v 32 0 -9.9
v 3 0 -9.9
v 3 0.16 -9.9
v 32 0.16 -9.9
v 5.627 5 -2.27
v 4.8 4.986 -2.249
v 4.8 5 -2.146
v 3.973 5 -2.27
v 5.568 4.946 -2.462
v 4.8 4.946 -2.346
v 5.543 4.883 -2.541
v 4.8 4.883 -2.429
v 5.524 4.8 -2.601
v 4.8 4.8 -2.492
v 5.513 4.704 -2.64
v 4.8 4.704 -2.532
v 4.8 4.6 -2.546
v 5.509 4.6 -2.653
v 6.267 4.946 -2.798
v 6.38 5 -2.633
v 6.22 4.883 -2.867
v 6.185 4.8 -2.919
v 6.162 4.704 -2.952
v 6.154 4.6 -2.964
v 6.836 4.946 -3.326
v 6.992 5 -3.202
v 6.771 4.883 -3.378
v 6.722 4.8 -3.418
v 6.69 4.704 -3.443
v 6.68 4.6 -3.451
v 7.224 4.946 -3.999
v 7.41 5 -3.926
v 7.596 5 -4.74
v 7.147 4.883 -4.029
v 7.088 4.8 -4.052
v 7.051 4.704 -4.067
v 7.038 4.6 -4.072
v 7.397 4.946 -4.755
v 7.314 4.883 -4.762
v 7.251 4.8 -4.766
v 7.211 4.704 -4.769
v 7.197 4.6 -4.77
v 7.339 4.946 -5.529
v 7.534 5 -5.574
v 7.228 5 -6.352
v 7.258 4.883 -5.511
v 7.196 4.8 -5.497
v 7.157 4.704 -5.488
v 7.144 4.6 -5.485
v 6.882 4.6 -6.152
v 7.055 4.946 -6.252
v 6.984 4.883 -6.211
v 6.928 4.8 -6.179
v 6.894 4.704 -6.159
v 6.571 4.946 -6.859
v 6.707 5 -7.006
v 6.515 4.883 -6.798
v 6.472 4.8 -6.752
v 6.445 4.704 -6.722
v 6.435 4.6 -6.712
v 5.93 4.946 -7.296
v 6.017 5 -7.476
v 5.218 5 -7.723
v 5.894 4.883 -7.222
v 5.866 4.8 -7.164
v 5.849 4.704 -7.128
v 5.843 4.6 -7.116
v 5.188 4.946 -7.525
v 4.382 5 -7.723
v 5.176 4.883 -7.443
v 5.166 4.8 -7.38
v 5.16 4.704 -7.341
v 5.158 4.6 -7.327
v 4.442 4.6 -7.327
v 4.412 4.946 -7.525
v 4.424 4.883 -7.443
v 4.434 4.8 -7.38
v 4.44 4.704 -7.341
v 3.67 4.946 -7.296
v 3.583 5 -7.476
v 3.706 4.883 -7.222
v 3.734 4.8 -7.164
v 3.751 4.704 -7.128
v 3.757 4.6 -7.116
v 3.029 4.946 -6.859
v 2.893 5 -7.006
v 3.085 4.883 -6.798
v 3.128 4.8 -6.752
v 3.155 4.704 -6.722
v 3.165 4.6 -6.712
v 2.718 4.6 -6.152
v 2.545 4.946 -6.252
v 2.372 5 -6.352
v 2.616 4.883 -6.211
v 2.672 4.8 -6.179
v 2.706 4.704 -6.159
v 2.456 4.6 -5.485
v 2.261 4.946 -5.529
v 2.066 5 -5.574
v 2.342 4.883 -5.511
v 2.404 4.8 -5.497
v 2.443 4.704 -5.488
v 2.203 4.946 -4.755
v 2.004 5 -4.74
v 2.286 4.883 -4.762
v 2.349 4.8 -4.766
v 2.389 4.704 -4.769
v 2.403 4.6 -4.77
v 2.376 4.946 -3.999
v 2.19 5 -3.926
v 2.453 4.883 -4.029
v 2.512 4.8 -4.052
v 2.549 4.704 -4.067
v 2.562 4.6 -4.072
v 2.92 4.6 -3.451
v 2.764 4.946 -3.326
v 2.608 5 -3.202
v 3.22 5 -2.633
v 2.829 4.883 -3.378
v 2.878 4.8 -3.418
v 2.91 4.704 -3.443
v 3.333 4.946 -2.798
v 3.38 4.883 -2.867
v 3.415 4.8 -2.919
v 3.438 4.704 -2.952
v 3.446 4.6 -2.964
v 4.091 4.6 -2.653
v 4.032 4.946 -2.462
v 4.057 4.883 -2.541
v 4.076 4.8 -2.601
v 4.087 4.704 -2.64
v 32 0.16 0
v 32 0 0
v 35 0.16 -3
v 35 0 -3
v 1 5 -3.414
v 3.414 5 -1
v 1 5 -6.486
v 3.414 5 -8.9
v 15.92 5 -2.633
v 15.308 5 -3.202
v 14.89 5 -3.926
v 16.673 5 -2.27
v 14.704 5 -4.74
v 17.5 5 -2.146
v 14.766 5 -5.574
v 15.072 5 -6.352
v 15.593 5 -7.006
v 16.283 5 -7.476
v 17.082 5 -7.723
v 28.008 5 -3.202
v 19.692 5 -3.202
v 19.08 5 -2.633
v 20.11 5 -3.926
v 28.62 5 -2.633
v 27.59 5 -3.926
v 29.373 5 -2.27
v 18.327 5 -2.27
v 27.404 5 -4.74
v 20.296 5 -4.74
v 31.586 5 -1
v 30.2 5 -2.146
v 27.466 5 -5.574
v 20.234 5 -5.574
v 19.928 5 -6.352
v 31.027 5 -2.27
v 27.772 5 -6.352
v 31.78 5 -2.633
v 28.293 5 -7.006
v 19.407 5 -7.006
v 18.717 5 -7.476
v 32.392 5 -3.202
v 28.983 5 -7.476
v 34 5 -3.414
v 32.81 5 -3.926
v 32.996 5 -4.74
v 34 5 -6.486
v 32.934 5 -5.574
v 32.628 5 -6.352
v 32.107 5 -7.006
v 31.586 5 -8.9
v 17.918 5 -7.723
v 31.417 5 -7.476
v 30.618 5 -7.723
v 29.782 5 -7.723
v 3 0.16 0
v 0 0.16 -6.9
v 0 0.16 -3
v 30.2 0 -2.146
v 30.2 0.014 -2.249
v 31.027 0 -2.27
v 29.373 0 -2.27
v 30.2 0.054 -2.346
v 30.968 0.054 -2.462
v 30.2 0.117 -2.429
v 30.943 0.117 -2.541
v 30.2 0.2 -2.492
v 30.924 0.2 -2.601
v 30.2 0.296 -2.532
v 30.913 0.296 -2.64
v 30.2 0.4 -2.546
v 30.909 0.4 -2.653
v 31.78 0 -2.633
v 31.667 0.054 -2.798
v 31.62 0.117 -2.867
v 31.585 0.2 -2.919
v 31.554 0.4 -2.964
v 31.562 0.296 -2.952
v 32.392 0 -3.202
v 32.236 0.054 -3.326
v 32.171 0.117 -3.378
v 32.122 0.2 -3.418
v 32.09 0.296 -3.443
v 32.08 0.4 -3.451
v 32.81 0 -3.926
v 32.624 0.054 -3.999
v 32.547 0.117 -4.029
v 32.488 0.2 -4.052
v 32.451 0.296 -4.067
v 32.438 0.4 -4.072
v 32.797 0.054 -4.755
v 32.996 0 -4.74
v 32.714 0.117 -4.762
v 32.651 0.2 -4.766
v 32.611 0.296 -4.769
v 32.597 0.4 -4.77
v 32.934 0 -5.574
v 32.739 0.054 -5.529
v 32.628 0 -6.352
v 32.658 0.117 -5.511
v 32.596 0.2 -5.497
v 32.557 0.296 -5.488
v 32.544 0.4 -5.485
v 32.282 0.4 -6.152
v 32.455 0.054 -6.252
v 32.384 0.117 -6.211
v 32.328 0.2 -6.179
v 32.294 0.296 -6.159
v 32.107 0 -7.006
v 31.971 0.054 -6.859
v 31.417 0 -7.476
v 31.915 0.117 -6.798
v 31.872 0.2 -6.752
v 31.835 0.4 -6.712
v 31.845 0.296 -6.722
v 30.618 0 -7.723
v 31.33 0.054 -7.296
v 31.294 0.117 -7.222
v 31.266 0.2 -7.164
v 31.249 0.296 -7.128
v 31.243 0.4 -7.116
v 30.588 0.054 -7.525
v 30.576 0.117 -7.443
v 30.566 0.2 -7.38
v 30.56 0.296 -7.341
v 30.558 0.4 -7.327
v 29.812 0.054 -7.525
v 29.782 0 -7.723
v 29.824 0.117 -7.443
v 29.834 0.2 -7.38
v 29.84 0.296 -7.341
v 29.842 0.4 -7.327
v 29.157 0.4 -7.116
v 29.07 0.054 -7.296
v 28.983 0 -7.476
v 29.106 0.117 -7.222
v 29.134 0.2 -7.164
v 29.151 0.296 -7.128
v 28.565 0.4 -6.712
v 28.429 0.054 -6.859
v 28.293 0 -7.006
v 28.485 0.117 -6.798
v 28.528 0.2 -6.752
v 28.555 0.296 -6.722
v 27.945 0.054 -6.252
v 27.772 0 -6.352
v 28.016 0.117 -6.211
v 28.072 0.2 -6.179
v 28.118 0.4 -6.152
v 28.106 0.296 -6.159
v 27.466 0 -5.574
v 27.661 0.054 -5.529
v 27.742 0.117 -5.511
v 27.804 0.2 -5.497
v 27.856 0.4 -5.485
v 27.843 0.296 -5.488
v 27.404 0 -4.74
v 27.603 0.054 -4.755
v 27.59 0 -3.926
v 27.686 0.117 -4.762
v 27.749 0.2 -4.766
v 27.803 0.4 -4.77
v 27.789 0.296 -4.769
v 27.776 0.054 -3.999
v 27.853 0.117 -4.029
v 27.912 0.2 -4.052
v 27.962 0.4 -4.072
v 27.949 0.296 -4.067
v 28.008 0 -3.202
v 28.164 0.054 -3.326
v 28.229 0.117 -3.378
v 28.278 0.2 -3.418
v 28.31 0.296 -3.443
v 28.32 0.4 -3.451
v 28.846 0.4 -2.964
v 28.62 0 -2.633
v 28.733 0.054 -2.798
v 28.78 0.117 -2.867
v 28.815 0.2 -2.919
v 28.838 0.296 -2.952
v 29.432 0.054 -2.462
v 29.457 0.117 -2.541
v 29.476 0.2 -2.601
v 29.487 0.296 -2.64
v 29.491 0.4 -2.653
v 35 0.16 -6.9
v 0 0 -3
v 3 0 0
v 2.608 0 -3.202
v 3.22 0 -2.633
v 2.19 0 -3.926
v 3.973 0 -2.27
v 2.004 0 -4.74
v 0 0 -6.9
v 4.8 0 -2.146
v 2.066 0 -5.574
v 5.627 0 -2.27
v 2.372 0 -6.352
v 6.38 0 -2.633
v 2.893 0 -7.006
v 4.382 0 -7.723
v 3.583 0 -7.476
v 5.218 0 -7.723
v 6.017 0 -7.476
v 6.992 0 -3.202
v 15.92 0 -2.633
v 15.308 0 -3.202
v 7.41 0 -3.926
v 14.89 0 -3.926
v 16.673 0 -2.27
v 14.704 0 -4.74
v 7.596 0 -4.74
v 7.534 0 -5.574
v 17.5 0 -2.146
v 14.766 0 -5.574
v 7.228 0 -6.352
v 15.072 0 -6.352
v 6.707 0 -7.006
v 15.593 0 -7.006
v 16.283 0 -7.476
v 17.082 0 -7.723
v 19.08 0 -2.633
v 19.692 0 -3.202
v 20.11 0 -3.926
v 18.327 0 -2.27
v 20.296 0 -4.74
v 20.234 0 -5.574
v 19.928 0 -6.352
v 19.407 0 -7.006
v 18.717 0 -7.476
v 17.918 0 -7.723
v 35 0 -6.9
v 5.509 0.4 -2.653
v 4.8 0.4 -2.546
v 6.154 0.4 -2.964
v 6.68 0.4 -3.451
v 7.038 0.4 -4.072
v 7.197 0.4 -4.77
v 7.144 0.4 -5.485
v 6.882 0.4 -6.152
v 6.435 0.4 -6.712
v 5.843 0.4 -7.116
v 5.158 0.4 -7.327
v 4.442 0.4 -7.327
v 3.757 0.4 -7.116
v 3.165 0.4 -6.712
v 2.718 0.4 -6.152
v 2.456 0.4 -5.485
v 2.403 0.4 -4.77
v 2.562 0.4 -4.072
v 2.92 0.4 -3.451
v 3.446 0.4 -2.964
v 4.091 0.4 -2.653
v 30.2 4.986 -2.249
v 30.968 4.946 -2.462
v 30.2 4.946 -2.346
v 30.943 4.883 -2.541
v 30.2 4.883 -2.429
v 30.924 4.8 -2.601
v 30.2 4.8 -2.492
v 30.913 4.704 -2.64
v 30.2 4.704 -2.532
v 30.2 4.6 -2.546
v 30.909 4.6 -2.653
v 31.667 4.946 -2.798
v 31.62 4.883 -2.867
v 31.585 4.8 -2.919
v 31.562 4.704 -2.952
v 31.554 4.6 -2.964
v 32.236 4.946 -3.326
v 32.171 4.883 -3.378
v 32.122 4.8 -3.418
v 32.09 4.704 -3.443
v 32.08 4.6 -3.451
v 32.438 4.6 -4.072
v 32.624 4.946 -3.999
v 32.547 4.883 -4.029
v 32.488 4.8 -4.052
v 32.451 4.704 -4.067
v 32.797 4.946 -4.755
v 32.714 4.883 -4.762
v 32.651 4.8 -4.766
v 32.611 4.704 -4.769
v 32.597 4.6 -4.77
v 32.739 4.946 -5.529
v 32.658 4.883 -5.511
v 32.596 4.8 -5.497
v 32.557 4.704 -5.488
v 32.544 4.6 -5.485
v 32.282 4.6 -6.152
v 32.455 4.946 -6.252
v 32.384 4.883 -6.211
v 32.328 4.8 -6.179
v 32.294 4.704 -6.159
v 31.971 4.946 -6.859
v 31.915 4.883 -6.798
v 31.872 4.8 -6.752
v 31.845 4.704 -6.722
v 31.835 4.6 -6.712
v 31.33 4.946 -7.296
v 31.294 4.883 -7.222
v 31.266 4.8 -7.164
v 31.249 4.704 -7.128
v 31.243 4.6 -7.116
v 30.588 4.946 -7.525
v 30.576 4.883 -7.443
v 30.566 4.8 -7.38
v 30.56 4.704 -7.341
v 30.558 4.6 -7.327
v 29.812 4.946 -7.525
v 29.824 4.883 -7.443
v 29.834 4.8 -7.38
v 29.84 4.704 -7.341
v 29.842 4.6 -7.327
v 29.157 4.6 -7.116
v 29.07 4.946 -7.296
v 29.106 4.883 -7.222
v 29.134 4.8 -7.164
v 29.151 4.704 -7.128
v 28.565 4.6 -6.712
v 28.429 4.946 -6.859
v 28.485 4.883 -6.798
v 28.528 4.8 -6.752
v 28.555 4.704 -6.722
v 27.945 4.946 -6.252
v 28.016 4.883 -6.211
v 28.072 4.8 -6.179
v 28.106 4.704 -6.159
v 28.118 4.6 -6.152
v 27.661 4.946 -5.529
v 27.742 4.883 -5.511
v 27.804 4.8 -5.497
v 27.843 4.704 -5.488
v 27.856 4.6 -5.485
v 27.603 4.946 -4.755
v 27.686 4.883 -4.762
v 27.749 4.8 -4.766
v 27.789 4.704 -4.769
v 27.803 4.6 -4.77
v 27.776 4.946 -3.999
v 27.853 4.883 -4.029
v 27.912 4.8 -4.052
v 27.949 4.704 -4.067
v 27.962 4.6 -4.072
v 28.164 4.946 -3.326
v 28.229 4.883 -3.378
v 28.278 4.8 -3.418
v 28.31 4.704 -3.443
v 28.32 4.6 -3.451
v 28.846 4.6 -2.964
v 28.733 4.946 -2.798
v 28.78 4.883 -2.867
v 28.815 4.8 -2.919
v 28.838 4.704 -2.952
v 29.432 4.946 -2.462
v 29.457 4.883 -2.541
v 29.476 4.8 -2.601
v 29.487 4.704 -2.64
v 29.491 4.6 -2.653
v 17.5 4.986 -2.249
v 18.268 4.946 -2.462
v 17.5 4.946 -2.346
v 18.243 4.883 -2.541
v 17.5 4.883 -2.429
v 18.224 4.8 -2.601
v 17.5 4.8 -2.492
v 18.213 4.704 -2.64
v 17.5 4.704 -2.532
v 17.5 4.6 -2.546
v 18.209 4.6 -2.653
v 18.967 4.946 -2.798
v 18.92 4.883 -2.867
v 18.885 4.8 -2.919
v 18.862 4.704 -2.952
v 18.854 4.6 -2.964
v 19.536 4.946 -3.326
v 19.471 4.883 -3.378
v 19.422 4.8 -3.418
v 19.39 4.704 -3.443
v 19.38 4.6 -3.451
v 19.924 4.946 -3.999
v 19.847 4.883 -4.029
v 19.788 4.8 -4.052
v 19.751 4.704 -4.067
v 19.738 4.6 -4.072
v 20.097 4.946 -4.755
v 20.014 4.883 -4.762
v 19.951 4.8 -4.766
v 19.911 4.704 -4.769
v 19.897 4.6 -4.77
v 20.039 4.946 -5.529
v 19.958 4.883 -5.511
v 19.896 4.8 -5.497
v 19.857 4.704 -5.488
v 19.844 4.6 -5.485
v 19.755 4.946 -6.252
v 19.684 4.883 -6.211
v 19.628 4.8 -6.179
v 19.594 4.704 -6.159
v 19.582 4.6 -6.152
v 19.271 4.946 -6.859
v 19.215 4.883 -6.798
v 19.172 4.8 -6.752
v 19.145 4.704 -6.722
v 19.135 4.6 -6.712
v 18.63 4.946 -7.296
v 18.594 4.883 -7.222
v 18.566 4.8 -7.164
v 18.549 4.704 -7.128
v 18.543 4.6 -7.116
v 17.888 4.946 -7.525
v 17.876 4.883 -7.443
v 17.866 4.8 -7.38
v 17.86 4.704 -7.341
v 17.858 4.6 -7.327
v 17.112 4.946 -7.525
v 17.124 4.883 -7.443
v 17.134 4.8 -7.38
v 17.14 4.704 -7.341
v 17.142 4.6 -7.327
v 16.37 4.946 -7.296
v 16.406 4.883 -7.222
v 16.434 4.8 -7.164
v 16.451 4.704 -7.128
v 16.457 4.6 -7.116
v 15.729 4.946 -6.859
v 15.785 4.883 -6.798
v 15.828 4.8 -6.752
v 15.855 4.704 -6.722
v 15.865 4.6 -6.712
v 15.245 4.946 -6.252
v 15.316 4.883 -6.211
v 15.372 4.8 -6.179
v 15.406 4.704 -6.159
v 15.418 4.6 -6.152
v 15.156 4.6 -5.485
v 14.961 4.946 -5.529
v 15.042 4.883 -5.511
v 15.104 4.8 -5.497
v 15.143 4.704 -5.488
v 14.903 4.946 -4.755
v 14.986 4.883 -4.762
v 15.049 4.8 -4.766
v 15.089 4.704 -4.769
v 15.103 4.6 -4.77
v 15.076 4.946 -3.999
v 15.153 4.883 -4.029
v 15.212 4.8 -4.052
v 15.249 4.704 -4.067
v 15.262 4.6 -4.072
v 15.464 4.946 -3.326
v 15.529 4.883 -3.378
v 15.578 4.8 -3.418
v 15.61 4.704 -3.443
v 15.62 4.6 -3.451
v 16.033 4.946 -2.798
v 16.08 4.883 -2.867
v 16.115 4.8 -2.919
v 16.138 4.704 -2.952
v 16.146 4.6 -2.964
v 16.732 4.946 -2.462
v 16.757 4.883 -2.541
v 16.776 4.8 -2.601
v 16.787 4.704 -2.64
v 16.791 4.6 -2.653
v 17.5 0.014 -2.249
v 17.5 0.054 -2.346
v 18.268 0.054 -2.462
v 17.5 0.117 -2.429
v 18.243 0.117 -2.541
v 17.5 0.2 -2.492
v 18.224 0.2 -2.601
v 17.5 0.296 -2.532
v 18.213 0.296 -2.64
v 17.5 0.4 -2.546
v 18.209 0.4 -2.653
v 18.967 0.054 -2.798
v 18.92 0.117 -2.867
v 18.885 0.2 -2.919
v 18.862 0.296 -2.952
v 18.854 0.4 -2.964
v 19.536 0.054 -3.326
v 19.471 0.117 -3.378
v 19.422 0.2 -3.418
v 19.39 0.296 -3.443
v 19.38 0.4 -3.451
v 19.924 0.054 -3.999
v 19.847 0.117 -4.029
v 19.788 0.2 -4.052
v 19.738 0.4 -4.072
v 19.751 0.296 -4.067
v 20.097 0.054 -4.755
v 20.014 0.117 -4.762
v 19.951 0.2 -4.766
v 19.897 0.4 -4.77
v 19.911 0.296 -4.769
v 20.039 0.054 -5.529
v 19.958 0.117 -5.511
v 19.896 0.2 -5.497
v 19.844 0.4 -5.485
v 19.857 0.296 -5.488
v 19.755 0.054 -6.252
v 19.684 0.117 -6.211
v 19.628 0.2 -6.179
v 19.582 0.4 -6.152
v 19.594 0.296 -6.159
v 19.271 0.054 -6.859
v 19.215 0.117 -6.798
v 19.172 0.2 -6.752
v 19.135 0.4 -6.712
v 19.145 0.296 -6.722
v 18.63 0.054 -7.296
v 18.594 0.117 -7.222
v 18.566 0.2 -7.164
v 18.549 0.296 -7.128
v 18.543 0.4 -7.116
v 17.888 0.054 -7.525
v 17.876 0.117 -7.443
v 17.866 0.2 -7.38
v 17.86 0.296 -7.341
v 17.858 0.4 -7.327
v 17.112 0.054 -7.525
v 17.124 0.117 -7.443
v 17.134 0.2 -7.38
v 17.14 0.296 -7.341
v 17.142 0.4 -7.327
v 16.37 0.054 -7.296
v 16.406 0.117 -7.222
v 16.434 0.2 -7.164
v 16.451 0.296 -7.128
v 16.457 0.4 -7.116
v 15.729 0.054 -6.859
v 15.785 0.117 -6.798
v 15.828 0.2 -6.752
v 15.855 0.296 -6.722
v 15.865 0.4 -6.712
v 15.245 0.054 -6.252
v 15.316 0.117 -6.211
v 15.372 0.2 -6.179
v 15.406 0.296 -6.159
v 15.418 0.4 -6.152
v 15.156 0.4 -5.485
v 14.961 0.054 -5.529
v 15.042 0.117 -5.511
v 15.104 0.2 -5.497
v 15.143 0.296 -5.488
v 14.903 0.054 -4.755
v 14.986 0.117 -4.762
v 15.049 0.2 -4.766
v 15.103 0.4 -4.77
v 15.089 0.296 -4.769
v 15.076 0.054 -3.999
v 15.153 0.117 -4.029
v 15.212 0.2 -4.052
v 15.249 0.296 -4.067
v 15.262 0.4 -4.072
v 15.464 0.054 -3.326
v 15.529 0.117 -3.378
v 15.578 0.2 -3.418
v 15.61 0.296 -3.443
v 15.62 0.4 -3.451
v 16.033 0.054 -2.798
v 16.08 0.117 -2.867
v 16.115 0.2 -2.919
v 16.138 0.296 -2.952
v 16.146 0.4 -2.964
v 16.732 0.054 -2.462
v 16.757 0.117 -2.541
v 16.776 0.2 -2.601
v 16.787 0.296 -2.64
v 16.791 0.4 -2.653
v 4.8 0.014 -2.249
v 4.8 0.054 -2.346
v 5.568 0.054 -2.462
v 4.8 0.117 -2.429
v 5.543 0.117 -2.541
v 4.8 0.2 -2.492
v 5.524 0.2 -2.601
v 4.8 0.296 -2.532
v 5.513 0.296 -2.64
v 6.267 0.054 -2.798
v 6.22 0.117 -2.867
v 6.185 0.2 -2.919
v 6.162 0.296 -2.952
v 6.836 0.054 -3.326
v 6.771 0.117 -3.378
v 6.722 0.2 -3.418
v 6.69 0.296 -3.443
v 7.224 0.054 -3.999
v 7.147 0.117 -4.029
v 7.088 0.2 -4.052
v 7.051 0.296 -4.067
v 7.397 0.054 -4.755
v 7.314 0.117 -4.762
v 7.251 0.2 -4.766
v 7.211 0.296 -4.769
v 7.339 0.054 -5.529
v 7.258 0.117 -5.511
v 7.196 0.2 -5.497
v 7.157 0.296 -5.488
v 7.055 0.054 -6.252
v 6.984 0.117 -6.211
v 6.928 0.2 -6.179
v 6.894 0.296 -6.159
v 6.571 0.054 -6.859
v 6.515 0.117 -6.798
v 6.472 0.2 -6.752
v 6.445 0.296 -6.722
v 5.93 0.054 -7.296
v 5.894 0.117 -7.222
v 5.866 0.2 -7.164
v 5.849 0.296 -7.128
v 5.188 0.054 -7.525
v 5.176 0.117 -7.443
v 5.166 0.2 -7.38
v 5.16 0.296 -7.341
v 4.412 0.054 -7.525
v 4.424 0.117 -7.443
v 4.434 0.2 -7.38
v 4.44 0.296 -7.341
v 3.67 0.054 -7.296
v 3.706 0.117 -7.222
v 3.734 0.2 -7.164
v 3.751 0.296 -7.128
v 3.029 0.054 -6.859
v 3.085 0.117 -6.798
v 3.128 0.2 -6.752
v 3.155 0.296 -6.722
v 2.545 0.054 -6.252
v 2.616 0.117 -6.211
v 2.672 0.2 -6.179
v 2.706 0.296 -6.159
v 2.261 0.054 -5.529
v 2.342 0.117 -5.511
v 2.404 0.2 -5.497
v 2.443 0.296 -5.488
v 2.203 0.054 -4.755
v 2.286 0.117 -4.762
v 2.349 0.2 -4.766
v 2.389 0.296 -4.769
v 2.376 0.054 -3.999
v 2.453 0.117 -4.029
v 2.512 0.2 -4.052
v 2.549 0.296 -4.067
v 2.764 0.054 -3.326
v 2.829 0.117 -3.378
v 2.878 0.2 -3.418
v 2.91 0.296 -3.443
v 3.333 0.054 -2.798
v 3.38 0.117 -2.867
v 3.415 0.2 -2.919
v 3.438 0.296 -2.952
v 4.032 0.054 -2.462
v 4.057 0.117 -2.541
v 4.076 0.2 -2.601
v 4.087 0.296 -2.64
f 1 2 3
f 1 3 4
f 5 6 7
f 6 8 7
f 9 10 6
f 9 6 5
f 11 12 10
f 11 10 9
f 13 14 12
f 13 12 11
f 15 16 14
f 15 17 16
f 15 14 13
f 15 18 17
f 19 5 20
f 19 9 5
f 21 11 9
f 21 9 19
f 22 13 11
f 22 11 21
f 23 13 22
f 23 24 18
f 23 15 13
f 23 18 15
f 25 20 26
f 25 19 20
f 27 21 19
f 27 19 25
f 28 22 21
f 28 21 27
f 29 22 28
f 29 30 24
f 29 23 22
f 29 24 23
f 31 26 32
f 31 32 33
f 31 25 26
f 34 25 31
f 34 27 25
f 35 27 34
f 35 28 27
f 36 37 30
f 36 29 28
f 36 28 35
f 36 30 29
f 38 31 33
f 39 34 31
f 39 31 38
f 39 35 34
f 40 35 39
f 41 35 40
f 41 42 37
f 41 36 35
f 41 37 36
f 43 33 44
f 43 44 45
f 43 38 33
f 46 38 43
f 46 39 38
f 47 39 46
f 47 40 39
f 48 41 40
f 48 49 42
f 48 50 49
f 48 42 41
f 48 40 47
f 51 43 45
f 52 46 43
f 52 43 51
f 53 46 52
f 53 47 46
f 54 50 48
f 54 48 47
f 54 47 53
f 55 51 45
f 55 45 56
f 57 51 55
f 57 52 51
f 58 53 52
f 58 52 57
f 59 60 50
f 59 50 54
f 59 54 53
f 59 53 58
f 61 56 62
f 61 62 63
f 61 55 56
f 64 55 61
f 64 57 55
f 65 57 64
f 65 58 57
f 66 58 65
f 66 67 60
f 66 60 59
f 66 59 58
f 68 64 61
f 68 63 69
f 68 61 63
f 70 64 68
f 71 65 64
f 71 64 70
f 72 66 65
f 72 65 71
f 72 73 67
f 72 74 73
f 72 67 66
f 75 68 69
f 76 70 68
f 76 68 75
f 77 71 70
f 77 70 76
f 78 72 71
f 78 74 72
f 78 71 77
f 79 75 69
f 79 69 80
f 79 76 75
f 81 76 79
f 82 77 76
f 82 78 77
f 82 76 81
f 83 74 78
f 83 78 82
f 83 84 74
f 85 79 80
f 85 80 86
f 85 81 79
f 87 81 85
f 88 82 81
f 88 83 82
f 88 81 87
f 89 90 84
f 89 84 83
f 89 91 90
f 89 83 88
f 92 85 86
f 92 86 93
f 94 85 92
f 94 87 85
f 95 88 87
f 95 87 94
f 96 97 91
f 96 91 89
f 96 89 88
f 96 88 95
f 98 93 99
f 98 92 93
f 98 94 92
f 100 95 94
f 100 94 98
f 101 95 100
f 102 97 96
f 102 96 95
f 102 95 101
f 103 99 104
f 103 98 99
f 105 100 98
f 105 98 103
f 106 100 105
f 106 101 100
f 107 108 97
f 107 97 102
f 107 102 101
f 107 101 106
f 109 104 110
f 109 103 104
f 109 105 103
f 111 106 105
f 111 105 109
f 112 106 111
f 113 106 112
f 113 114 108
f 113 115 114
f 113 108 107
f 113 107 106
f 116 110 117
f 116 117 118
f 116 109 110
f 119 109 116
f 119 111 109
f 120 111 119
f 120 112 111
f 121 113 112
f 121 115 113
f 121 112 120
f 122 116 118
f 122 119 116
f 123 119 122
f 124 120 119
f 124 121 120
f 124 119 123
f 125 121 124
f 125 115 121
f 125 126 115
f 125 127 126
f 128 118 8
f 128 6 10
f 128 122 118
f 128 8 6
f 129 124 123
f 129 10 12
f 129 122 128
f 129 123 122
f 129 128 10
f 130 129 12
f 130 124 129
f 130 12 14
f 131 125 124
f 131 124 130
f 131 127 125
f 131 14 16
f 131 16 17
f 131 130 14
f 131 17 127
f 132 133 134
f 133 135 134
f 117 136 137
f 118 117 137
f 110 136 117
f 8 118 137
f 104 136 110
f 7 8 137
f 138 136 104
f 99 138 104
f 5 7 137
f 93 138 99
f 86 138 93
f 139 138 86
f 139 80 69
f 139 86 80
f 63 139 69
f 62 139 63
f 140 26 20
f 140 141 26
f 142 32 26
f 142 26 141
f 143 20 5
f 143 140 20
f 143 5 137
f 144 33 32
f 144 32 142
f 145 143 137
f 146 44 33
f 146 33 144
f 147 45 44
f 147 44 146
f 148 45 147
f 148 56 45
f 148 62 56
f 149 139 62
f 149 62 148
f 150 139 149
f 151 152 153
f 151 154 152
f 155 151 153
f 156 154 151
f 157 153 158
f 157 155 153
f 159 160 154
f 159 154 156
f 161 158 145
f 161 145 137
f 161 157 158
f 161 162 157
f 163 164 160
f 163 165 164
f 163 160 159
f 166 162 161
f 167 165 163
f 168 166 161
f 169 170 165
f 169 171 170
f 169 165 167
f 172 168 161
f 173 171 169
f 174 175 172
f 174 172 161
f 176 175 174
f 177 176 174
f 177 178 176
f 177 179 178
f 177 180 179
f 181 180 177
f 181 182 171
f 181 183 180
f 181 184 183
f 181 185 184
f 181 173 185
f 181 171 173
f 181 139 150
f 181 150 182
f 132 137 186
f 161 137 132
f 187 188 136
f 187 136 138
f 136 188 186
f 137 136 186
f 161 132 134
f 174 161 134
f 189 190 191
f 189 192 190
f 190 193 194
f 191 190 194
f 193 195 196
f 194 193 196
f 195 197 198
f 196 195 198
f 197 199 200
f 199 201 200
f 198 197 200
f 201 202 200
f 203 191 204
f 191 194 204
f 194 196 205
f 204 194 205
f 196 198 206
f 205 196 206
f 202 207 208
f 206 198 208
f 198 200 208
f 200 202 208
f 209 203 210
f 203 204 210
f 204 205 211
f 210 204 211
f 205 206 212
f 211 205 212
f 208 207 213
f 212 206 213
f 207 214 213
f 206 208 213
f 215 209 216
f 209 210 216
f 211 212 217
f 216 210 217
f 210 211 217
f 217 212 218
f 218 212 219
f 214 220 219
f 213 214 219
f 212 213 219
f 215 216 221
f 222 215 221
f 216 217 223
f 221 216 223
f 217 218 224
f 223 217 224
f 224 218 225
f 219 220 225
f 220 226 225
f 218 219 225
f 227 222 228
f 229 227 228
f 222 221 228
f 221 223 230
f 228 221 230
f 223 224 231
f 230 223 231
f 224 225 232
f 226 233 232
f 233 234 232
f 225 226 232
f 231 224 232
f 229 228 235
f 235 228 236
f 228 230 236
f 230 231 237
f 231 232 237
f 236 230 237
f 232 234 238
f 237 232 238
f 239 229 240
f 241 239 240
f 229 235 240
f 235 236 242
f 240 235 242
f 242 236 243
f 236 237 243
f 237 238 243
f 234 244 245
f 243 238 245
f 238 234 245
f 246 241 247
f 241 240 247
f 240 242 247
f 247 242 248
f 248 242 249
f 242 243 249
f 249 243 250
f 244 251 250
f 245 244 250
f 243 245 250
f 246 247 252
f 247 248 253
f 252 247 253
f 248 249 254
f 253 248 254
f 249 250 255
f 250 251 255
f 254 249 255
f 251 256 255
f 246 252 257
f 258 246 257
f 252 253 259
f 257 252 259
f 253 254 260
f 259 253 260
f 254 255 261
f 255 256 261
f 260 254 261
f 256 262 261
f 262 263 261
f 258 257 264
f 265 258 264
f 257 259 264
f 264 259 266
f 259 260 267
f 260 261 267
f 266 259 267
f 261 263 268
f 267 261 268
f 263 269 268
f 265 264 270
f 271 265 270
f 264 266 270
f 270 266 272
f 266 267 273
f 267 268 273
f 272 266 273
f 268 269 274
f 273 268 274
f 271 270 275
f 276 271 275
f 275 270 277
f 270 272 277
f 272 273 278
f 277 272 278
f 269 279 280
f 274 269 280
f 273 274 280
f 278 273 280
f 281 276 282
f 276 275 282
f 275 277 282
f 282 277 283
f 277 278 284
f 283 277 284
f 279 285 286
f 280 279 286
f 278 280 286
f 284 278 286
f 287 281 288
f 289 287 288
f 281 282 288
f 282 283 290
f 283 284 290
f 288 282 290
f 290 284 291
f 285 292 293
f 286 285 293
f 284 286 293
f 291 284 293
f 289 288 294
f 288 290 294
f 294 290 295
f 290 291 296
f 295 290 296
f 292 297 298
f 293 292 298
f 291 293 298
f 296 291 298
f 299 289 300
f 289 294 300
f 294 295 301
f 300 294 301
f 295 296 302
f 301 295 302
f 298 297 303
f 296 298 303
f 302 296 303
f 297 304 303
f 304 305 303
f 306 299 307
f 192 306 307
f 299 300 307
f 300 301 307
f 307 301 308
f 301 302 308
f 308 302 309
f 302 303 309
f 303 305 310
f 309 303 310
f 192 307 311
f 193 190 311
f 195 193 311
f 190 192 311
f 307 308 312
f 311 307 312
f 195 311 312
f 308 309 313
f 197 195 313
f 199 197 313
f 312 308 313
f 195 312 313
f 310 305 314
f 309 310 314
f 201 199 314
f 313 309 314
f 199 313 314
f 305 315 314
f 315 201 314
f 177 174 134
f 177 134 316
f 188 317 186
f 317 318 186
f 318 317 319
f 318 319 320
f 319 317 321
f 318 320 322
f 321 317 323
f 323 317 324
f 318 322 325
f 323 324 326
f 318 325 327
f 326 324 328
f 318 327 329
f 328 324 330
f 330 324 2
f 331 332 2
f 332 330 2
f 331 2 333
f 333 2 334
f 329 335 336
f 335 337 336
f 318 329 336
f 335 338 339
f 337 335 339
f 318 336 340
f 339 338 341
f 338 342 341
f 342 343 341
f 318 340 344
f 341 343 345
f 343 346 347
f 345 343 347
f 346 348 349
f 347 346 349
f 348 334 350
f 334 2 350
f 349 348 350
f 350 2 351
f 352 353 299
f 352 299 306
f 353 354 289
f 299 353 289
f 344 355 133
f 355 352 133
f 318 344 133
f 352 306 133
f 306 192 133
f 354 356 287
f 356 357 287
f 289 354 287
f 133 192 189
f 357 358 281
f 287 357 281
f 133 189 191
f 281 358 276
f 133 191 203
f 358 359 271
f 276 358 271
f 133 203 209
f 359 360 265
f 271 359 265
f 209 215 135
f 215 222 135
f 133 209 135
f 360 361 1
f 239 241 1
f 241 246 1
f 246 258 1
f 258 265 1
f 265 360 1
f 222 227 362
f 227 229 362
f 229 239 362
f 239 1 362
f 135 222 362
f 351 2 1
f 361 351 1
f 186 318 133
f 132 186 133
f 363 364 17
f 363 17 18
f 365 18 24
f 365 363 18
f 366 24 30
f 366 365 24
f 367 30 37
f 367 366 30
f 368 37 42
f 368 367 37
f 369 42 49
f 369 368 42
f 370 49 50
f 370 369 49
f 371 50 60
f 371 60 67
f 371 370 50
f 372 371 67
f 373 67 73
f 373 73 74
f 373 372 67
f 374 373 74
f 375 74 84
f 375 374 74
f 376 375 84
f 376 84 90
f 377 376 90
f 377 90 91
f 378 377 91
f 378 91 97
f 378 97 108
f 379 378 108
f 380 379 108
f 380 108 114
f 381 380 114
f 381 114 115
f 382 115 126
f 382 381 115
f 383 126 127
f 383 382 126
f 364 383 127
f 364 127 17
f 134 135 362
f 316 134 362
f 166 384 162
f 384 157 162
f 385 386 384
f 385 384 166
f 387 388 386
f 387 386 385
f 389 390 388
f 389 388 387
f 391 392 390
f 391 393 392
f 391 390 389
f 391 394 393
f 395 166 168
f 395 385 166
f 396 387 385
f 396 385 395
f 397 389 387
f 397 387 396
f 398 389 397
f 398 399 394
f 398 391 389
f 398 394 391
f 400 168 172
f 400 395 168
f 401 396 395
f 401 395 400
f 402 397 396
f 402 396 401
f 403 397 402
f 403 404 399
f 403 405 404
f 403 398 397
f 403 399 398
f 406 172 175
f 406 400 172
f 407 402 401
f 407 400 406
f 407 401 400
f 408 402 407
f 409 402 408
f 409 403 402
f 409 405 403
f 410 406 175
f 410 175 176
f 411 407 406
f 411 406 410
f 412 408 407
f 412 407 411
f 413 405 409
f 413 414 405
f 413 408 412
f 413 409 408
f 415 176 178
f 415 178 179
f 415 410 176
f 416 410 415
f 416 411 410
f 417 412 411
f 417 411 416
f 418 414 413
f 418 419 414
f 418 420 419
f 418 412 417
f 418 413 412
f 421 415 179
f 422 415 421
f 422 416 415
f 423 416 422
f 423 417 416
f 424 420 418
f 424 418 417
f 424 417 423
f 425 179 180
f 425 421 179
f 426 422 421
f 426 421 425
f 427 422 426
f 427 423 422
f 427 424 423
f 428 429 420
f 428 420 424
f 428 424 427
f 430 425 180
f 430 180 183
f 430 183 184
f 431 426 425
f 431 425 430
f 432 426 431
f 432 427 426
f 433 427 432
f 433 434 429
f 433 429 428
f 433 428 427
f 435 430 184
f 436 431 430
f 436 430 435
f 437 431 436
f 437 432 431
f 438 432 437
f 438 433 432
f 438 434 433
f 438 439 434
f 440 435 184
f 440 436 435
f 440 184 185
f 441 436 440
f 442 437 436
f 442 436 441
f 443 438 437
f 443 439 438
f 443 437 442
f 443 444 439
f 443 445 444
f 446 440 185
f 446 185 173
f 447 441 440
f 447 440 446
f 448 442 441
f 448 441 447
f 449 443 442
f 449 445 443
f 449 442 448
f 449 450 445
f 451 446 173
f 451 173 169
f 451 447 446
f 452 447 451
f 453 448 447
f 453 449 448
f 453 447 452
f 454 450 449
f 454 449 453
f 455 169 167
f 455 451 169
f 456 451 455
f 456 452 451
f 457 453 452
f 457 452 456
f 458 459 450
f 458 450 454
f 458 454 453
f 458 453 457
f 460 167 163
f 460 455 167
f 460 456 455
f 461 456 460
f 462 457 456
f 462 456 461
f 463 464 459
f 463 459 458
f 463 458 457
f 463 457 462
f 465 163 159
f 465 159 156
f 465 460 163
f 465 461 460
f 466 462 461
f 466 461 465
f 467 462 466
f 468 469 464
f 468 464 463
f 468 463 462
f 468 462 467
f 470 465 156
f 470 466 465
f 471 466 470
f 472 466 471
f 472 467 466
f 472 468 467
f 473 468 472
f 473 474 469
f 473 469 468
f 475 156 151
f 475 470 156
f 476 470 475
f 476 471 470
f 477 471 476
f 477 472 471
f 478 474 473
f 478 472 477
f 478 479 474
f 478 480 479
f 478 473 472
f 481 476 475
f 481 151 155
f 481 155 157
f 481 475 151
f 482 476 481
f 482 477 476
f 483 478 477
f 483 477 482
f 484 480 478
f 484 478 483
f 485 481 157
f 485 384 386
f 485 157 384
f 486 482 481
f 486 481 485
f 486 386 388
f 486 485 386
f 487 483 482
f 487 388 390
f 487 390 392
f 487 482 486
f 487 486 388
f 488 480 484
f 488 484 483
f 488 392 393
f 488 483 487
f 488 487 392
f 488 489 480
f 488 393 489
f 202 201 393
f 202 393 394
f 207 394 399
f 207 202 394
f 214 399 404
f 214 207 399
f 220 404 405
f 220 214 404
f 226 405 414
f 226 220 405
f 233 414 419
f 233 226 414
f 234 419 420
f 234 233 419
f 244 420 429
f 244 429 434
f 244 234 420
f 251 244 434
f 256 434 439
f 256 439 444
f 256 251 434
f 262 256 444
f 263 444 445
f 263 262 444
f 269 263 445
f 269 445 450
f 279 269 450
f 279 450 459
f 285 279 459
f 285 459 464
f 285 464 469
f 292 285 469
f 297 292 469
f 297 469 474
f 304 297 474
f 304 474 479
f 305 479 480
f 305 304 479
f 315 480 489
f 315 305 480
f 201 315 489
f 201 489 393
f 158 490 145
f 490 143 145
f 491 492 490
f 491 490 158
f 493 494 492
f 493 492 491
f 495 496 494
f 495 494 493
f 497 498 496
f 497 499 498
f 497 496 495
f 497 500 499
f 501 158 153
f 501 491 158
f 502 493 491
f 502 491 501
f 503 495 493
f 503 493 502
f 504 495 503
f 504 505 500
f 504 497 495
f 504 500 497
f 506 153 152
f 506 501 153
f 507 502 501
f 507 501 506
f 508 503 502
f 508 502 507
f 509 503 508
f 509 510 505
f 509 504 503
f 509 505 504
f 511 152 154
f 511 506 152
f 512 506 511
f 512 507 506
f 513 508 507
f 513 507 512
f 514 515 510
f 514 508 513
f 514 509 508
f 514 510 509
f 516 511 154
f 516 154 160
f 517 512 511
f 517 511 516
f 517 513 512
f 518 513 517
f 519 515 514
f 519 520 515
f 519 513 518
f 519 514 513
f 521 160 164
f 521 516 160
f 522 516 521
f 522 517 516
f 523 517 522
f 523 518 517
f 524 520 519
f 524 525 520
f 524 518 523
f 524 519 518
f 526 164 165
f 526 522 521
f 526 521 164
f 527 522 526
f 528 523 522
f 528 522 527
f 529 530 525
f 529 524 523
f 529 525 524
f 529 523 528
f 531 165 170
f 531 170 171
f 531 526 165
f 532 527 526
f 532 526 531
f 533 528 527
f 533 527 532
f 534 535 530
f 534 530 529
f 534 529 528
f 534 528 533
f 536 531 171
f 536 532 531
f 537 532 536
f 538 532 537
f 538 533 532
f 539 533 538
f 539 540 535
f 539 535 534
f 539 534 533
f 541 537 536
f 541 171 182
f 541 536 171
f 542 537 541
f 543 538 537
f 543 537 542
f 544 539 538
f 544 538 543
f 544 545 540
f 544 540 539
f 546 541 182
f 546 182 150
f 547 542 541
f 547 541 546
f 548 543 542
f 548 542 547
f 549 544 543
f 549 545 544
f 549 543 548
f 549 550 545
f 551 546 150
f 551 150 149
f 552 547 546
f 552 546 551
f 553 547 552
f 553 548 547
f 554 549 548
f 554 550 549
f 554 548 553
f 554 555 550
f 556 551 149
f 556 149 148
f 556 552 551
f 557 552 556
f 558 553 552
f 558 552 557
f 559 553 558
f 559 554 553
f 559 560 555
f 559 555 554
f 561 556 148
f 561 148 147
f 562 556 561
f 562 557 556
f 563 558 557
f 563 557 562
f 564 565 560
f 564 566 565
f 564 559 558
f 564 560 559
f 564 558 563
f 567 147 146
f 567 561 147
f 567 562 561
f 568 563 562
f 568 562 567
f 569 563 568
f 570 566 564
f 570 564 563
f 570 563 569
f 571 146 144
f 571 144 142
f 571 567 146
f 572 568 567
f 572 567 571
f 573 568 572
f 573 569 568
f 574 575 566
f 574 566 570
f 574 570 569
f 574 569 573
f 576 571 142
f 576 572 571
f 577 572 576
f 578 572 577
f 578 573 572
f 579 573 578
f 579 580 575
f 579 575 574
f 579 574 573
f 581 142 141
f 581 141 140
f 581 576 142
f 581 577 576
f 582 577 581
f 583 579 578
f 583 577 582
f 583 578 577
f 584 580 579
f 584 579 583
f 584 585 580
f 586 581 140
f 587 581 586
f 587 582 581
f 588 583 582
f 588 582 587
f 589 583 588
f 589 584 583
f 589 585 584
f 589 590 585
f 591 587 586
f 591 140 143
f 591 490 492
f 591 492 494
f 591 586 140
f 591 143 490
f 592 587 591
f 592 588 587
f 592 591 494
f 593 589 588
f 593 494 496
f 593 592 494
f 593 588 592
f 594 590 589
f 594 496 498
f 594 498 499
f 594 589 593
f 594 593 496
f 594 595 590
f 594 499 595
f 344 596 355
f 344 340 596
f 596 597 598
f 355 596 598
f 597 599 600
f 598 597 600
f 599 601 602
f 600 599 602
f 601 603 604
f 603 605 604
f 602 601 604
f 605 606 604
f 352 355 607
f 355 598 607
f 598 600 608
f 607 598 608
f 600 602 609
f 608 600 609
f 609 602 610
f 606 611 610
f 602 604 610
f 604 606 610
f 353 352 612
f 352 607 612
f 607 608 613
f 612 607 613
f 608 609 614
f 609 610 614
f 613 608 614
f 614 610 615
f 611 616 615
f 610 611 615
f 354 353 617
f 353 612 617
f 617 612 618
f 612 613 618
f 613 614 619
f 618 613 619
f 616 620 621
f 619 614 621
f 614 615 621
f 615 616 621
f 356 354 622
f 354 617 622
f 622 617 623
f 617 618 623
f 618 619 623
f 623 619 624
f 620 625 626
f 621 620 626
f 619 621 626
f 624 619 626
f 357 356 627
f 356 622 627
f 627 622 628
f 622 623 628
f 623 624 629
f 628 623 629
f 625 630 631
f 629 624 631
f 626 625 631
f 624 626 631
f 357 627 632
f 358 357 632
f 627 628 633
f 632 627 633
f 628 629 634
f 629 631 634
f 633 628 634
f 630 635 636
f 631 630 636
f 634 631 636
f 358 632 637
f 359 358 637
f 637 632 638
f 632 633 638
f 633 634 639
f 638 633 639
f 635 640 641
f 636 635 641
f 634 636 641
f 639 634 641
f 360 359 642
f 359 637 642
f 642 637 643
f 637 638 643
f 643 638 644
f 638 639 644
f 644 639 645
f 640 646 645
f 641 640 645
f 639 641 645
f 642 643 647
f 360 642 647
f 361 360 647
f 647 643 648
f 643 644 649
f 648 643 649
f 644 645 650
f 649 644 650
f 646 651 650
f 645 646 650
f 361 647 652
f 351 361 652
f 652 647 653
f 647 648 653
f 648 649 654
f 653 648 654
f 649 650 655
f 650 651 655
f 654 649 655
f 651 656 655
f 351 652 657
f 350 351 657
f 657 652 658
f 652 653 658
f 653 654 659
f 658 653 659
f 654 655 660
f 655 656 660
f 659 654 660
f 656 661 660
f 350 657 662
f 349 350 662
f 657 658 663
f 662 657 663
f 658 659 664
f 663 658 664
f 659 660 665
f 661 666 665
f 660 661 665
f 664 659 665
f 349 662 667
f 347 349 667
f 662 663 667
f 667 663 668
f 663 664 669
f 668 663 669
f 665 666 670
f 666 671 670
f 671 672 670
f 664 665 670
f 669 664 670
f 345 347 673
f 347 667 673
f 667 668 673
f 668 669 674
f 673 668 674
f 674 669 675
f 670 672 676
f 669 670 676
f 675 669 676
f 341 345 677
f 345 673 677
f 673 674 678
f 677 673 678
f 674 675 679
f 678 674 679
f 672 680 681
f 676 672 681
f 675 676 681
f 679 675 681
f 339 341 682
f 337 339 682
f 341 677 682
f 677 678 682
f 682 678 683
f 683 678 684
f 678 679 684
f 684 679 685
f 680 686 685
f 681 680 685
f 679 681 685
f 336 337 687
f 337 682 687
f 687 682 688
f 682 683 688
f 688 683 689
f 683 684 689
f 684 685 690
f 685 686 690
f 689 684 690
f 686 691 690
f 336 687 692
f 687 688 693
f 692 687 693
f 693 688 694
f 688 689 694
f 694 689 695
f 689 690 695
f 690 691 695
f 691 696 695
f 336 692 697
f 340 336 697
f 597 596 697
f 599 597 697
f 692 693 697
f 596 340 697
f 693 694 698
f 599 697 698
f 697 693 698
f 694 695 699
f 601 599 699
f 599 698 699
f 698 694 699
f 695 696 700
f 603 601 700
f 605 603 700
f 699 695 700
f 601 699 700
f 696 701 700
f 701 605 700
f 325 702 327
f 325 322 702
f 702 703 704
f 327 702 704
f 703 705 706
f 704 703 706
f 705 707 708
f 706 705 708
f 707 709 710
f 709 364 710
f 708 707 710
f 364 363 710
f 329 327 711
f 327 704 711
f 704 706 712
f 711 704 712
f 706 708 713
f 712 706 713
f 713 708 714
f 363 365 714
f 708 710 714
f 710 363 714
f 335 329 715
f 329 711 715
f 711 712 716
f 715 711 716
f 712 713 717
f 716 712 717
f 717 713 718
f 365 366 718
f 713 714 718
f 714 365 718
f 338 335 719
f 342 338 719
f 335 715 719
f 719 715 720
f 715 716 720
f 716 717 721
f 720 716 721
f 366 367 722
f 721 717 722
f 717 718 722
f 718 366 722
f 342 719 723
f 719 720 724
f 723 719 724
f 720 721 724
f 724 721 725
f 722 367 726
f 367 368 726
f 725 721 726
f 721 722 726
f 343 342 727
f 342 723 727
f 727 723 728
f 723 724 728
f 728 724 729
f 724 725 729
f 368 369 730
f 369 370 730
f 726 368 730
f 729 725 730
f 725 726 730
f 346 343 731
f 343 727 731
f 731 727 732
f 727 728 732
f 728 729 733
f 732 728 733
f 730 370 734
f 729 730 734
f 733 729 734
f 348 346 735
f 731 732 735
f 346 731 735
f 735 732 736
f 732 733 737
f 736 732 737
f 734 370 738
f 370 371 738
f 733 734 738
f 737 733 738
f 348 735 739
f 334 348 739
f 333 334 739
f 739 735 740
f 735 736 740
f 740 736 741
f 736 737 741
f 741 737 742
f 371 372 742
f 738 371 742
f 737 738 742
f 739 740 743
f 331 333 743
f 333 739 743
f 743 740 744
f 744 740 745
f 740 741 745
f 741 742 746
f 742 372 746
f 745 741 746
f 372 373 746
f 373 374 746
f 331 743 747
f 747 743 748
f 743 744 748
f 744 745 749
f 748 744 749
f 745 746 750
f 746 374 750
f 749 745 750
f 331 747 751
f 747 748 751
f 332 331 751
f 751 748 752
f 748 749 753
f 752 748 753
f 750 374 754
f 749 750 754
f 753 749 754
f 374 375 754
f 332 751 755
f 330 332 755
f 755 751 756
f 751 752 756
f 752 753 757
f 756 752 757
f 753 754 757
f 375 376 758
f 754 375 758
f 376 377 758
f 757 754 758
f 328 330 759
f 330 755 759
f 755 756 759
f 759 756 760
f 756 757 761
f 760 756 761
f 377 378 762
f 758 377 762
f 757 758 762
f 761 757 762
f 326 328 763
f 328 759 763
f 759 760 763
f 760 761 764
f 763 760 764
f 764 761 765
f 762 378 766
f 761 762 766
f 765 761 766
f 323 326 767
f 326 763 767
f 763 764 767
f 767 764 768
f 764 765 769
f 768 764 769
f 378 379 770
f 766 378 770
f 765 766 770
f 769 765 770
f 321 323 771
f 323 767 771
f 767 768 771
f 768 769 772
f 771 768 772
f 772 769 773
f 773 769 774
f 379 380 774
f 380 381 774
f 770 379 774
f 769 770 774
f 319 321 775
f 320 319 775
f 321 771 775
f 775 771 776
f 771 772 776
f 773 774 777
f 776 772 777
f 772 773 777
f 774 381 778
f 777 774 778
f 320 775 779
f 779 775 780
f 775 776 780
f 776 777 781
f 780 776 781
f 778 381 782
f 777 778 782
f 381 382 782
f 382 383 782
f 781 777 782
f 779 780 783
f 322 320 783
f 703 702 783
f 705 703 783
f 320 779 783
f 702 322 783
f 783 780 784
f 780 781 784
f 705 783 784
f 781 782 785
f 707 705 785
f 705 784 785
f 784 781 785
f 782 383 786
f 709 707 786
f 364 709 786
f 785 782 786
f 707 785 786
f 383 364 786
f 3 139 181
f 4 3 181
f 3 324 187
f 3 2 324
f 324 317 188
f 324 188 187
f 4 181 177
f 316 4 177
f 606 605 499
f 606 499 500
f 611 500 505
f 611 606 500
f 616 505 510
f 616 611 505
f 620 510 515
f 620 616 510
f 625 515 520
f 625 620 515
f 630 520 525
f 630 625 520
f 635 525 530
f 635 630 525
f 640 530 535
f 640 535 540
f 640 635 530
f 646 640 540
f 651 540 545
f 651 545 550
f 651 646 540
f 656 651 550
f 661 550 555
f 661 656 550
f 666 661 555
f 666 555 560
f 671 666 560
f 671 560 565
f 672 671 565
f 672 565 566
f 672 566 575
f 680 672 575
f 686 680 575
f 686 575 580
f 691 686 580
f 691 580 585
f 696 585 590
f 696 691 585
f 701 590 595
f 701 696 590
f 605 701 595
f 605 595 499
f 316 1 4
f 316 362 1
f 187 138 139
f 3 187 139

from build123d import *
from OCP.BRepFilletAPI import BRepFilletAPI_MakeChamfer

# Parameters (mm, degrees)
SKETCH1_W           = 35
SKETCH1_H           = 9.9
SKETCH1_R           = 2.404163056
BOSS_EXTRUDE1_DEPTH = 5
CHAMFER1_SIZE       = 3
CHAMFER2_SIZE       = 4.84
CHAMFER2_SIZE2      = 1
FILLET1_R           = 0.4


with BuildPart() as part:
    # Sketch1 → Boss-Extrude1 (new body)
    with BuildSketch(Plane(origin=(0, 0, 0), x_dir=(1, 0, 0), z_dir=(0, 1, 0))):
        with Locations((17.5, 4.95)):
            Rectangle(SKETCH1_W, SKETCH1_H)
        with Locations(Location((4.8, 4.95, 0), (0, 0, 270))):
            Circle(SKETCH1_R, mode=Mode.SUBTRACT)
        with Locations(Location((17.5, 4.95, 0), (0, 0, 270))):
            Circle(SKETCH1_R, mode=Mode.SUBTRACT)
        with Locations(Location((30.2, 4.95, 0), (0, 0, 270))):
            Circle(SKETCH1_R, mode=Mode.SUBTRACT)
    extrude(amount=BOSS_EXTRUDE1_DEPTH)

    # Chamfer1
    chamfer1_edges = [part.edges().sort_by_distance(p)[0] for p in [
        (0, 2.5, -9.9),
        (35, 2.5, -9.9),
        (35, 2.5, 0),
        (0, 2.5, 0),
    ]]
    chamfer(chamfer1_edges, length=CHAMFER1_SIZE)

    # Chamfer2: one chamfer whose edges measure the first distance from different faces: ONE call of the kernel's chamfer builder (chamfer() names one face for all edges)
    chamfer2_edges_1 = [part.edges().sort_by_distance(p)[0] for p in [
        (35, 5, -4.95),
    ]]
    chamfer2_side_1 = [part.faces().sort_by_distance(p)[0] for p in [
        (35, 2.5, -4.95),
    ]]
    chamfer2_edges_2 = [part.edges().sort_by_distance(p)[0] for p in [
        (17.5, 5, 0),
    ]]
    chamfer2_side_2 = [part.faces().sort_by_distance(p)[0] for p in [
        (17.5, 2.5, 0),
    ]]
    chamfer2_edges_3 = [part.edges().sort_by_distance(p)[0] for p in [
        (0, 5, -4.95),
    ]]
    chamfer2_side_3 = [part.faces().sort_by_distance(p)[0] for p in [
        (0, 2.5, -4.95),
    ]]
    chamfer2_edges_4 = [part.edges().sort_by_distance(p)[0] for p in [
        (17.5, 5, -9.9),
    ]]
    chamfer2_side_4 = [part.faces().sort_by_distance(p)[0] for p in [
        (17.5, 2.5, -9.9),
    ]]
    chamfer2_edges_5 = [part.edges().sort_by_distance(p)[0] for p in [
        (1.5, 5, -1.5),
    ]]
    chamfer2_side_5 = [part.faces().sort_by_distance(p)[0] for p in [
        (1.5, 2.5, -1.5),
    ]]
    chamfer2_edges_6 = [part.edges().sort_by_distance(p)[0] for p in [
        (1.5, 5, -8.4),
    ]]
    chamfer2_side_6 = [part.faces().sort_by_distance(p)[0] for p in [
        (1.5, 2.5, -8.4),
    ]]
    chamfer2_edges_7 = [part.edges().sort_by_distance(p)[0] for p in [
        (33.5, 5, -8.4),
    ]]
    chamfer2_side_7 = [part.faces().sort_by_distance(p)[0] for p in [
        (33.5, 2.5, -8.4),
    ]]
    chamfer2_edges_8 = [part.edges().sort_by_distance(p)[0] for p in [
        (33.5, 5, -1.5),
    ]]
    chamfer2_side_8 = [part.faces().sort_by_distance(p)[0] for p in [
        (33.5, 2.5, -1.5),
    ]]
    chamfer2 = BRepFilletAPI_MakeChamfer(part.part.solid().wrapped)
    for e in chamfer2_edges_1:
        chamfer2.Add(CHAMFER2_SIZE, CHAMFER2_SIZE2, e.wrapped, chamfer2_side_1[0].wrapped)  # the first distance lies on this face
    for e in chamfer2_edges_2:
        chamfer2.Add(CHAMFER2_SIZE, CHAMFER2_SIZE2, e.wrapped, chamfer2_side_2[0].wrapped)  # the first distance lies on this face
    for e in chamfer2_edges_3:
        chamfer2.Add(CHAMFER2_SIZE, CHAMFER2_SIZE2, e.wrapped, chamfer2_side_3[0].wrapped)  # the first distance lies on this face
    for e in chamfer2_edges_4:
        chamfer2.Add(CHAMFER2_SIZE, CHAMFER2_SIZE2, e.wrapped, chamfer2_side_4[0].wrapped)  # the first distance lies on this face
    for e in chamfer2_edges_5:
        chamfer2.Add(CHAMFER2_SIZE, CHAMFER2_SIZE2, e.wrapped, chamfer2_side_5[0].wrapped)  # the first distance lies on this face
    for e in chamfer2_edges_6:
        chamfer2.Add(CHAMFER2_SIZE, CHAMFER2_SIZE2, e.wrapped, chamfer2_side_6[0].wrapped)  # the first distance lies on this face
    for e in chamfer2_edges_7:
        chamfer2.Add(CHAMFER2_SIZE, CHAMFER2_SIZE2, e.wrapped, chamfer2_side_7[0].wrapped)  # the first distance lies on this face
    for e in chamfer2_edges_8:
        chamfer2.Add(CHAMFER2_SIZE, CHAMFER2_SIZE2, e.wrapped, chamfer2_side_8[0].wrapped)  # the first distance lies on this face
    add(Compound.cast(chamfer2.Shape()), mode=Mode.REPLACE)

    # Fillet1
    fillet1_edges = [part.edges().sort_by_distance(p)[0] for p in [
        (4.8, 0, -7.354163056),
        (4.8, 5, -7.354163056),
        (17.5, 0, -7.354163056),
        (17.5, 5, -7.354163056),
        (30.2, 0, -7.354163056),
        (30.2, 5, -7.354163056),
    ]]
    fillet(fillet1_edges, radius=FILLET1_R)


solid = part.part
